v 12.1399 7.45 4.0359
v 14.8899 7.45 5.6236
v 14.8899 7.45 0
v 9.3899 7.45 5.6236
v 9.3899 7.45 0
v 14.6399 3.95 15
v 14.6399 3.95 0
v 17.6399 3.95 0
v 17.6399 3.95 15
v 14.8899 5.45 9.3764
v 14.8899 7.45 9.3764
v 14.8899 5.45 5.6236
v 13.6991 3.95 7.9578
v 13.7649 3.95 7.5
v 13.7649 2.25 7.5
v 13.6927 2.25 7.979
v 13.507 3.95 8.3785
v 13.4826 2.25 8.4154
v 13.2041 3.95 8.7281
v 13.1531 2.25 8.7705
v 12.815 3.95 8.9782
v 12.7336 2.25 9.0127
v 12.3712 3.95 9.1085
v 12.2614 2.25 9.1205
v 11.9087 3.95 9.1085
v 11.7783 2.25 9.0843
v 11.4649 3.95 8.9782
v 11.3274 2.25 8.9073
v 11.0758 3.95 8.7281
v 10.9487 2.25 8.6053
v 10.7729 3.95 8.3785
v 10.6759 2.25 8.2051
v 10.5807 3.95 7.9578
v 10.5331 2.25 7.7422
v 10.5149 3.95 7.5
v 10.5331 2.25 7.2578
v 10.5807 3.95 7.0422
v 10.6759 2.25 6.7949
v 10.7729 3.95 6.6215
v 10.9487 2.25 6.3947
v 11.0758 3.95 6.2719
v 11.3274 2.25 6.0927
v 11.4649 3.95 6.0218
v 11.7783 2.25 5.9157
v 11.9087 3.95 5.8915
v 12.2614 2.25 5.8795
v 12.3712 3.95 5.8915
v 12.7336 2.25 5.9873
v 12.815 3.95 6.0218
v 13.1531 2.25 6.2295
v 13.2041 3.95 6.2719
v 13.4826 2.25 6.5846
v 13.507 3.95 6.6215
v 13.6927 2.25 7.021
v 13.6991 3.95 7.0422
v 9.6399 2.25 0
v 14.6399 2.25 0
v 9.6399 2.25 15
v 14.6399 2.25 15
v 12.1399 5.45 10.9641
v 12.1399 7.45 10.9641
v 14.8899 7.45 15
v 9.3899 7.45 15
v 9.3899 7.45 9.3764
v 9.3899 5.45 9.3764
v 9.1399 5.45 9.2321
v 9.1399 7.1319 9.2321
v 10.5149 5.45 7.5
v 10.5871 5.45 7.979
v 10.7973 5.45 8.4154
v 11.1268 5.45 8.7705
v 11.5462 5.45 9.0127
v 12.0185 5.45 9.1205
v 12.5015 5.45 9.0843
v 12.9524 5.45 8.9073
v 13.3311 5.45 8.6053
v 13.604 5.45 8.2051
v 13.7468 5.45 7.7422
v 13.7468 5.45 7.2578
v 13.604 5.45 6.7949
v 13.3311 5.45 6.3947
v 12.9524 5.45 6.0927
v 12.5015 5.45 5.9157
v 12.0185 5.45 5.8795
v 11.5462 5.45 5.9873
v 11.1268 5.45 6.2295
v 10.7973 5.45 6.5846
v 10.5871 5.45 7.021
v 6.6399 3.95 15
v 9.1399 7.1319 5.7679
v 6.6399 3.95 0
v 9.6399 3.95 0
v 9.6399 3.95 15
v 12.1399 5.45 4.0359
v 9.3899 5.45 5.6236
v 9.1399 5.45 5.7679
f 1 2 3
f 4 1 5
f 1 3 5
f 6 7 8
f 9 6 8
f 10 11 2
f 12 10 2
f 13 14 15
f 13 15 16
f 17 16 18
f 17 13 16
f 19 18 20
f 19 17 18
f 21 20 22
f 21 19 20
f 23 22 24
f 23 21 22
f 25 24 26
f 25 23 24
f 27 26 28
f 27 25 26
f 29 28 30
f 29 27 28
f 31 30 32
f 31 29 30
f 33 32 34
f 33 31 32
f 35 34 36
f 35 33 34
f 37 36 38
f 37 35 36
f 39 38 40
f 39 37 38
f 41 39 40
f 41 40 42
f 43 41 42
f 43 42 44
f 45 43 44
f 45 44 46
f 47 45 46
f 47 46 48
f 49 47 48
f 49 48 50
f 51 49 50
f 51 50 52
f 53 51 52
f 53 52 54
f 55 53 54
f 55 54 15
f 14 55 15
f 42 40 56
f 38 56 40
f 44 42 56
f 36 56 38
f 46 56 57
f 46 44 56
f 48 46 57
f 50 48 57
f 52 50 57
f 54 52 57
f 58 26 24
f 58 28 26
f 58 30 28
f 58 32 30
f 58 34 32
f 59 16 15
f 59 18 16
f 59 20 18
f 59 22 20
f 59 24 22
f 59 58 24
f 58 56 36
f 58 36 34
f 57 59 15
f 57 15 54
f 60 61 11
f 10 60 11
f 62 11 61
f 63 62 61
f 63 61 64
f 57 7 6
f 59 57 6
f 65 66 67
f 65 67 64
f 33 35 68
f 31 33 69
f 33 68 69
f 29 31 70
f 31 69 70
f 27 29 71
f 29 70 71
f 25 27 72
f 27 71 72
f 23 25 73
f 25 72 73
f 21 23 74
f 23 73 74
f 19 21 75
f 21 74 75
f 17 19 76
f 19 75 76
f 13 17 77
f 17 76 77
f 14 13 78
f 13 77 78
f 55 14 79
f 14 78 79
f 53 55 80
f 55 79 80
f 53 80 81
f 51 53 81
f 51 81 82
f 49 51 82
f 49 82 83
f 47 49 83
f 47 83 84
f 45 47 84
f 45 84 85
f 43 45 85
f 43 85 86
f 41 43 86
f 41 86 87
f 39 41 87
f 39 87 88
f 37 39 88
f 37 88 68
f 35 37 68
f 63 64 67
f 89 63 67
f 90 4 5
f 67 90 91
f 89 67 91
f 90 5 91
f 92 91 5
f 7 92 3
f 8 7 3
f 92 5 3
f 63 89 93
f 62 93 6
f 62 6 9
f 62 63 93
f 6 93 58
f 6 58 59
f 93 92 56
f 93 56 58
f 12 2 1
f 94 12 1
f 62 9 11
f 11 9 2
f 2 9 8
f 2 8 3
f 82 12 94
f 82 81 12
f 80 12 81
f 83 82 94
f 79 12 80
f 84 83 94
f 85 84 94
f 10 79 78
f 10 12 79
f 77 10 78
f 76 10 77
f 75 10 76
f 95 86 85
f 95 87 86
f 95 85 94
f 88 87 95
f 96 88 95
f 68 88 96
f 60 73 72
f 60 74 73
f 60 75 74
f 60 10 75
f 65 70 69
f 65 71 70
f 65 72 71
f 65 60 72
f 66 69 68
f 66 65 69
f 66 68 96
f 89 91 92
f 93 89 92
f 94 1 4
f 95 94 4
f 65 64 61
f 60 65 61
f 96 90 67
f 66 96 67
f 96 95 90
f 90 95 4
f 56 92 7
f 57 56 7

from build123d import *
from build123d import SkipClean  # not in build123d's __all__

# Parameters (mm, degrees)
F1_DEPTH = 15
F2_R     = 1.625
F3_DEPTH = 25
F4_DEPTH = 2
F5_W     = 5
F5_H     = 15
F5_R     = 1.625
F6_DEPTH = 1.7


with BuildPart() as f1:
    # F0 (on Top) → F1 (new body)
    with BuildSketch(Plane.XY):
        Polygon((14.889925763, 7.4500351371), (12.139925763, 7.4500351371), (9.389925763, 7.4500351371), (6.639925763, 3.9500351371), (12.139925763, 3.9500351371), (17.639925763, 3.9500351371), align=None)
    extrude(amount=F1_DEPTH)

    # F2 (on face) → F3 (cut)
    with BuildSketch(Plane(origin=(0, 7.4500351371, 0), x_dir=(-1, 0, 0), z_dir=(0, 1, 0))):
        with Locations((-12.139925763, 7.5)):
            Circle(F2_R)
    extrude(amount=-F3_DEPTH, mode=Mode.SUBTRACT)

    # F2 (on face) → F4 (cut)
    with BuildSketch(Plane(origin=(0, 7.4500351371, 0), x_dir=(-1, 0, 0), z_dir=(0, 1, 0))):
        Polygon((-9.139925763, 5.7679491924), (-9.139925763, 9.2320508076), (-9.389925763, 9.3763883749), (-9.389925763, 5.6236116251), align=None)
        Polygon((-9.389925763, 5.6236116251), (-9.389925763, 9.3763883749), (-12.139925763, 10.9641016151), (-14.889925763, 9.3763883749), (-14.889925763, 5.6236116251), (-12.139925763, 4.0358983849), align=None)
        with Locations((-12.139925763, 7.5)):
            Circle(F2_R, mode=Mode.SUBTRACT)
    extrude(amount=-F4_DEPTH, mode=Mode.SUBTRACT)

    # F5 (on face) → F6 (join)
    with BuildSketch(Plane.XZ.offset(-3.9500351371)):
        with Locations((12.139925763, 7.5)):
            Rectangle(F5_W, F5_H)
        with Locations((12.139925763, 7.5)):
            Circle(F5_R, mode=Mode.SUBTRACT)
    with SkipClean():  # cleaning this boolean's faces spoils the solid; the shape is the same uncleaned
        extrude(amount=F6_DEPTH)


solid = f1.part
